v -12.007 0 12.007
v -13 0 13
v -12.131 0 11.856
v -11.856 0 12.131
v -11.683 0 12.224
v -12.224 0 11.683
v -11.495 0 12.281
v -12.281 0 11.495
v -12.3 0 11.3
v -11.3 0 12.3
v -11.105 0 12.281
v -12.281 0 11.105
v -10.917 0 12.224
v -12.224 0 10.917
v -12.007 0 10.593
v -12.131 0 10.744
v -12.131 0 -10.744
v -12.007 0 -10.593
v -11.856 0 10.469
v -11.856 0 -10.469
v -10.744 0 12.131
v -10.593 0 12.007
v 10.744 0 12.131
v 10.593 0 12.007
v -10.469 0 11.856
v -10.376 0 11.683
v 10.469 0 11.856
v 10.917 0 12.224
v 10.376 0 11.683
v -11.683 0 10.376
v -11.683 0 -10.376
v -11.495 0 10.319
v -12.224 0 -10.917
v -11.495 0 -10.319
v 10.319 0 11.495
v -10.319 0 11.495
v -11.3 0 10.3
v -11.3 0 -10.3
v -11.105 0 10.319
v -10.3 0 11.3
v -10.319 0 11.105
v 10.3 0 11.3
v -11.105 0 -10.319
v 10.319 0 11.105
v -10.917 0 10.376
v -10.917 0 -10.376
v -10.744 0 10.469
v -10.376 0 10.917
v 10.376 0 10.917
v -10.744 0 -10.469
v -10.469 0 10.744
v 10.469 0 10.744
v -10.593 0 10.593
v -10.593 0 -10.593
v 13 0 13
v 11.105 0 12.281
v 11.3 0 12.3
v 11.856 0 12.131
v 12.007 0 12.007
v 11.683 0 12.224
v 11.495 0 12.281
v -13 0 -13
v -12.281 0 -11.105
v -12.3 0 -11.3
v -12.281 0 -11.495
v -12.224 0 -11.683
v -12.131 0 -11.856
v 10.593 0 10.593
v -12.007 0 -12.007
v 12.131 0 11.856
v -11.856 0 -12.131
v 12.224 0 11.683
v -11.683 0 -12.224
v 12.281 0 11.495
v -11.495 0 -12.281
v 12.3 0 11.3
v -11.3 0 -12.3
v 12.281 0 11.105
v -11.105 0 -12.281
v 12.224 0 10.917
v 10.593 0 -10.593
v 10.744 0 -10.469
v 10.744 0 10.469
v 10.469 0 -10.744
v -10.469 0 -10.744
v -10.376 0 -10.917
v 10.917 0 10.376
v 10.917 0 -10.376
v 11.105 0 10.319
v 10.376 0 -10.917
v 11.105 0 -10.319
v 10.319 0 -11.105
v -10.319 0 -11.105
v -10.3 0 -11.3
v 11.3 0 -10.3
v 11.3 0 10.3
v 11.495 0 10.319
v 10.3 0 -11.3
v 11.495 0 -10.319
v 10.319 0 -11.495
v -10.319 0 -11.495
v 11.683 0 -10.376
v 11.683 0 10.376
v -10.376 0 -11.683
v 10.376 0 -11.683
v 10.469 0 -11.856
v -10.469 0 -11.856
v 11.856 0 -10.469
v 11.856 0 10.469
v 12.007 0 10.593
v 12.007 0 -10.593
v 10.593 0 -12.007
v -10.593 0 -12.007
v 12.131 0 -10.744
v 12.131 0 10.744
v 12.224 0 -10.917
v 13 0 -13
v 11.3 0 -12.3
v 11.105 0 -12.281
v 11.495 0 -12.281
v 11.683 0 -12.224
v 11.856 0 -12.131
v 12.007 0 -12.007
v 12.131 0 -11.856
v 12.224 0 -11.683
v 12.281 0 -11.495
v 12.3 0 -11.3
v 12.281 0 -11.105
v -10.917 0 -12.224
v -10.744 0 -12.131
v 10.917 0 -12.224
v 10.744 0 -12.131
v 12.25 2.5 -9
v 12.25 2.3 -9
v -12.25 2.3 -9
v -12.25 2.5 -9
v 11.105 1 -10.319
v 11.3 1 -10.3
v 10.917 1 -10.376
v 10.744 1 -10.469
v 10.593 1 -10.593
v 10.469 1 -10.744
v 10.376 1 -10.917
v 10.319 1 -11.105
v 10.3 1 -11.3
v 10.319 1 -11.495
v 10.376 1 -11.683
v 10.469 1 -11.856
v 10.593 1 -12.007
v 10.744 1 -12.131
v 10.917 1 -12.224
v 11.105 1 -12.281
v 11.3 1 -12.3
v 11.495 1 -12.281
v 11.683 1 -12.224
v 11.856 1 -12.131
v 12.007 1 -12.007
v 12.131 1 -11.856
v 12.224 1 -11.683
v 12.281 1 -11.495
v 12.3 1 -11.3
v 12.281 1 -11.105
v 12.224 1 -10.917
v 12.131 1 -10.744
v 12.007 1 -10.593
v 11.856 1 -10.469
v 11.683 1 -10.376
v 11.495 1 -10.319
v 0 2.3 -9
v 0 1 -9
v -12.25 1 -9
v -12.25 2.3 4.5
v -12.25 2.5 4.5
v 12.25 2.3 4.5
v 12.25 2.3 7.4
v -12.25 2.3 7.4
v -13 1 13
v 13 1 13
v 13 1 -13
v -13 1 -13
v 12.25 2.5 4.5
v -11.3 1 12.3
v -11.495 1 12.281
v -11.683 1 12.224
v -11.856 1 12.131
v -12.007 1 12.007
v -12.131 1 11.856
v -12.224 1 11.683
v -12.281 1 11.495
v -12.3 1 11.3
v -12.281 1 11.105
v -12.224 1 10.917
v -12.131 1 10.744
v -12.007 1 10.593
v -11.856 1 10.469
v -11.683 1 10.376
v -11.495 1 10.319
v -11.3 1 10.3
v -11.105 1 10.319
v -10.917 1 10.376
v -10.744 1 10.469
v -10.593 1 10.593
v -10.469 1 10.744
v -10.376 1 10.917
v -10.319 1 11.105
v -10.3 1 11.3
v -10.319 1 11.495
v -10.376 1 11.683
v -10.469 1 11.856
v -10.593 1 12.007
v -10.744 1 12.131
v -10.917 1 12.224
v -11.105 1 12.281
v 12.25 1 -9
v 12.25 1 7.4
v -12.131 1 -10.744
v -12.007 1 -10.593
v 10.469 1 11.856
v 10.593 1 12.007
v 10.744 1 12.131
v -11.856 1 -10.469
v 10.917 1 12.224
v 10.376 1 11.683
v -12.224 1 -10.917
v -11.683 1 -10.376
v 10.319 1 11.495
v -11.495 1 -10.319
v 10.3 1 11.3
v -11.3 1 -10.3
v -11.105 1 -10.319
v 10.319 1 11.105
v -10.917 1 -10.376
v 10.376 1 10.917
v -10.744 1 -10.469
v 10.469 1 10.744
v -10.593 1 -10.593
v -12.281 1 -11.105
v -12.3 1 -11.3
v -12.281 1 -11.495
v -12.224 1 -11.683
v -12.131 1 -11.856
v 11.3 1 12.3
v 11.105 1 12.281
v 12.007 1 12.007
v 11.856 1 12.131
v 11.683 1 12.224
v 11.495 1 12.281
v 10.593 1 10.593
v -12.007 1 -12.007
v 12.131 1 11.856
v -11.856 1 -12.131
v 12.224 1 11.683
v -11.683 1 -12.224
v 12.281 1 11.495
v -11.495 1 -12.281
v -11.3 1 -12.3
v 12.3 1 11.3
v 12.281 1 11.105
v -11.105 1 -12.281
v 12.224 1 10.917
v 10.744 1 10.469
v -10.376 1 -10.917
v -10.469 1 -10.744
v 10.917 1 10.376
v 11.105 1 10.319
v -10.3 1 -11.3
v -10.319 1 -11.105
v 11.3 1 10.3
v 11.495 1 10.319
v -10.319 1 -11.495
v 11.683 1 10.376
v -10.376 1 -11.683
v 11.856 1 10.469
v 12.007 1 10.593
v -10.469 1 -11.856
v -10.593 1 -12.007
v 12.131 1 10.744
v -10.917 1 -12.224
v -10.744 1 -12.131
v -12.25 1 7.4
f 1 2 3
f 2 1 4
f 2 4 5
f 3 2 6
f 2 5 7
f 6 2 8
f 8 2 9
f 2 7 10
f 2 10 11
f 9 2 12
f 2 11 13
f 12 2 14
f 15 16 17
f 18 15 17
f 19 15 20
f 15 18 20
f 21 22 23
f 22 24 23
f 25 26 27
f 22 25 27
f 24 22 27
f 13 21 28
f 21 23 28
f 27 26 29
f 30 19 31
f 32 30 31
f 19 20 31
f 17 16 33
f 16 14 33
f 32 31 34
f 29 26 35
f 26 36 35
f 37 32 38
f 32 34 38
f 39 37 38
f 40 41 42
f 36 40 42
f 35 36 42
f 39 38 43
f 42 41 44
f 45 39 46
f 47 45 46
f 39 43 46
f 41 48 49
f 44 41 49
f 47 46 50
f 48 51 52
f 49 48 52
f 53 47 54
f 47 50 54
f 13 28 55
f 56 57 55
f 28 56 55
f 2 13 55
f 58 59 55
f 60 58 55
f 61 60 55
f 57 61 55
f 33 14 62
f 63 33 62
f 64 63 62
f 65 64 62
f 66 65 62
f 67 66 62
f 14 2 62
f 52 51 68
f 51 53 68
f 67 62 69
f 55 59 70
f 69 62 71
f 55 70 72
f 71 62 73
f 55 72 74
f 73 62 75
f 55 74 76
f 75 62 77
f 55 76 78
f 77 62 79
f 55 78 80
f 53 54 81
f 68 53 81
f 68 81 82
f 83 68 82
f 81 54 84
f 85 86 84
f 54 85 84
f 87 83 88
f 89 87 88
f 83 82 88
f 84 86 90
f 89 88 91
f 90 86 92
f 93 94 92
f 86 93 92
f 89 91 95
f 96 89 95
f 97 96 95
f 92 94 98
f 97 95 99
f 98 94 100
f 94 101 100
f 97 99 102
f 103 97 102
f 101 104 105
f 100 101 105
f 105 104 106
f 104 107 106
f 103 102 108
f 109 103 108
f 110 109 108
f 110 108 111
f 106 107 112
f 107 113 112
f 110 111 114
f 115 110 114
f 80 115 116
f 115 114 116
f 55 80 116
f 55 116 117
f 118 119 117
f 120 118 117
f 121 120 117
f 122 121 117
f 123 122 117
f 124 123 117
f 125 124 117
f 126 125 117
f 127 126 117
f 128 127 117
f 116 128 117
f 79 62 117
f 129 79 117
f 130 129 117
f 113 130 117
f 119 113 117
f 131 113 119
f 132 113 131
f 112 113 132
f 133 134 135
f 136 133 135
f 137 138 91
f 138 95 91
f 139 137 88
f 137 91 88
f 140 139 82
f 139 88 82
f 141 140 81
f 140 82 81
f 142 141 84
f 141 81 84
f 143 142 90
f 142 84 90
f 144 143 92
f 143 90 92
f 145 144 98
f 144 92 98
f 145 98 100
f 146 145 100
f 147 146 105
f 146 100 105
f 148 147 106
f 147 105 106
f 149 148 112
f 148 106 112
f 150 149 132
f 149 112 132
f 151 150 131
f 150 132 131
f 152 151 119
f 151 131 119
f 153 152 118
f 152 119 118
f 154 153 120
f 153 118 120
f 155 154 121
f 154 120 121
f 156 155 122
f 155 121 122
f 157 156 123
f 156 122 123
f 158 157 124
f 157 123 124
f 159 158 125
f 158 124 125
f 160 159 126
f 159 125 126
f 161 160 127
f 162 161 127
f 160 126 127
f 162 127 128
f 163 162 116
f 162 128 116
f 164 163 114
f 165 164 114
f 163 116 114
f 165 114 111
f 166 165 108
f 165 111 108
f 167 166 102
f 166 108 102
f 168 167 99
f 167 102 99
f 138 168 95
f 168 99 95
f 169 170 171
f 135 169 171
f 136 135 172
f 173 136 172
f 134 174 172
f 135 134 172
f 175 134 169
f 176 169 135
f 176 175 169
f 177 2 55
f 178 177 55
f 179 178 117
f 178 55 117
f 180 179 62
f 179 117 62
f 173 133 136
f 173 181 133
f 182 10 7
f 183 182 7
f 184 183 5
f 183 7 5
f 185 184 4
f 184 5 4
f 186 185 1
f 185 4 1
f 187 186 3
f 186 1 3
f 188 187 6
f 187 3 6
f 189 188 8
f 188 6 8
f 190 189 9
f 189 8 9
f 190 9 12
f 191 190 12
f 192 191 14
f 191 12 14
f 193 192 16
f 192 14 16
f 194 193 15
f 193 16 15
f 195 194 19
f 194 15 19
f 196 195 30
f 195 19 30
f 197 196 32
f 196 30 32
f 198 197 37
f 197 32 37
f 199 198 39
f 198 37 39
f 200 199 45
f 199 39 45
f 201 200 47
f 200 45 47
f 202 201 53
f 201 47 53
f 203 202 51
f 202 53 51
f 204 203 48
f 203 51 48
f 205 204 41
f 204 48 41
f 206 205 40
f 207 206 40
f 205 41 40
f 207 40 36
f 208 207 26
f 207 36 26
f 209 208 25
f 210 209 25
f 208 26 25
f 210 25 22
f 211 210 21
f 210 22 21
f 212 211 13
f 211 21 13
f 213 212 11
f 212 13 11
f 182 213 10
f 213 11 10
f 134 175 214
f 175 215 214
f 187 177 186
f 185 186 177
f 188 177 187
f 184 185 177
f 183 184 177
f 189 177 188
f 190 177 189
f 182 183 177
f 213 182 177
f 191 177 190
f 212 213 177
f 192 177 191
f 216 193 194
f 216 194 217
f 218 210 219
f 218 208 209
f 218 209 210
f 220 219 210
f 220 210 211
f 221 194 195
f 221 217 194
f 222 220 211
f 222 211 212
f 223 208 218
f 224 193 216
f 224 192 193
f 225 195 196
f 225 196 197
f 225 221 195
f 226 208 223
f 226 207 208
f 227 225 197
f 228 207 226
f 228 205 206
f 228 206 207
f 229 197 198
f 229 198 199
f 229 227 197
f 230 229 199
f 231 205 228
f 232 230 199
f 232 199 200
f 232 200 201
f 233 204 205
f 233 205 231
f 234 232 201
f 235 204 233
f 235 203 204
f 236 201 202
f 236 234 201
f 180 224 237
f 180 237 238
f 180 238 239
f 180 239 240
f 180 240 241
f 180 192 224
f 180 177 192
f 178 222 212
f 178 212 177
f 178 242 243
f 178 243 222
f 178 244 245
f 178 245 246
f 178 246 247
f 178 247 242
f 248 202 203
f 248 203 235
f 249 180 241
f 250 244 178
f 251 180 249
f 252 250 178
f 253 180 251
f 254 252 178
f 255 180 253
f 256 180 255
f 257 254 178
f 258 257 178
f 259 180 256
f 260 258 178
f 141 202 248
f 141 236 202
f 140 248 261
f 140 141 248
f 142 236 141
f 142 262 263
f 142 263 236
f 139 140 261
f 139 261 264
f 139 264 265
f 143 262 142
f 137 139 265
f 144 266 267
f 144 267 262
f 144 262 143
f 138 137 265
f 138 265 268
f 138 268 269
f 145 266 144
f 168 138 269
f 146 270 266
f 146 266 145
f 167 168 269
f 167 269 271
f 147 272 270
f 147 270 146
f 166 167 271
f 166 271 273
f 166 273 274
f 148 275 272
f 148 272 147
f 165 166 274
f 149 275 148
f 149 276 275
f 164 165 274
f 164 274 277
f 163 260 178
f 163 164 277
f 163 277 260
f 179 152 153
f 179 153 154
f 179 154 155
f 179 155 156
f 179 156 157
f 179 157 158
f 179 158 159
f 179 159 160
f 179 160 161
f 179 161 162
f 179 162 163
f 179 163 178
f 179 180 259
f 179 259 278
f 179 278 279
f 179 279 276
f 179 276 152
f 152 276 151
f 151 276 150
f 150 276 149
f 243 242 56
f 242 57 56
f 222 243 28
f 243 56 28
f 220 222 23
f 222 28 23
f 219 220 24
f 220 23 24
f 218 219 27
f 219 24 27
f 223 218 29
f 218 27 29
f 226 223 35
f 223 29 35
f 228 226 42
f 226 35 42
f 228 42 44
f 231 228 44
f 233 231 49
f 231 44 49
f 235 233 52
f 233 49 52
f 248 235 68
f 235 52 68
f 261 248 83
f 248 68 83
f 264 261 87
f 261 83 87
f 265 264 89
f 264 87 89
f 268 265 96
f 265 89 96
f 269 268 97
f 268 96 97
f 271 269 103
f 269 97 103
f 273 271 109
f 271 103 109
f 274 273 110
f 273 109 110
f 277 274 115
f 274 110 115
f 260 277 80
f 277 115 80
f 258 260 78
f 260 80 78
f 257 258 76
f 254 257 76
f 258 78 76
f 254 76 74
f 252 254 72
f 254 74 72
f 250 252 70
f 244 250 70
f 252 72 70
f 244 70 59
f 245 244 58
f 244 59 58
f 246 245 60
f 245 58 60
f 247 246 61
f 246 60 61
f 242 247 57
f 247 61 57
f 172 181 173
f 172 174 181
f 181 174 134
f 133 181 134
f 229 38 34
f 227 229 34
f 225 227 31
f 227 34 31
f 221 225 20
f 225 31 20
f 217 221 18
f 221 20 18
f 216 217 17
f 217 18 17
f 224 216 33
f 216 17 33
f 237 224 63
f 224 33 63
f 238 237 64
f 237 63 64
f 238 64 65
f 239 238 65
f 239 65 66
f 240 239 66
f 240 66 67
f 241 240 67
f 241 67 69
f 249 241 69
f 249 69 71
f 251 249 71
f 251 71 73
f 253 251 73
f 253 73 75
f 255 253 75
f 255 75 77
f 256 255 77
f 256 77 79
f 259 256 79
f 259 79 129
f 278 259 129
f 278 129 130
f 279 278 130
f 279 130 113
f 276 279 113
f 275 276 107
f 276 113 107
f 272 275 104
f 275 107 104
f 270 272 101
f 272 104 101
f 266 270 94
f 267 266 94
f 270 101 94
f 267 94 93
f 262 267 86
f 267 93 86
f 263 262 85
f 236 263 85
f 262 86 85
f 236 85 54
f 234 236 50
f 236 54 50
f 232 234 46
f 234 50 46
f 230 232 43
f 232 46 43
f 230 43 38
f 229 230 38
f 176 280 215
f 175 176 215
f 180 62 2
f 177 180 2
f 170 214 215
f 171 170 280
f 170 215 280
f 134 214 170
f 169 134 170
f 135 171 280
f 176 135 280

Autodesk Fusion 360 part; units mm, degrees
sketch "Sketch1" plane through (0, 0, 0) normal (0, 1, 0) x (1, 0, 0)
  line L0 (13, 13) -> (-13, 13)
  line L1 (-13, 13) -> (-13, -13)
  line L2 (-13, -13) -> (13, -13)
  line L3 (13, -13) -> (13, 13)
  line L4 (13, 13) -> (-13, -13) construction
  line L5 (-13, 13) -> (13, -13) construction
  dimension "d1" = 26
  dimension "d2" = 26
extrude "Extrude1" add sketch "Sketch1" along normal blind 1 makes body 1
hole "Hole1" at (-11.3, 1, -11.3) direction (0, -1, 0) diameter 2 depth 3.5 tip angle 118 bodies 1
hole "Hole2" at (11.3, 1, -11.3) direction (0, -1, 0) diameter 2 depth 3.5 tip angle 118 bodies 1
hole "Hole3" at (-11.3, 1, 11.3) direction (0, -1, 0) diameter 2 depth 3.5 tip angle 118 bodies 1
hole "Hole4" at (11.3, 1, 11.3) direction (0, -1, 0) diameter 2 depth 3.5 tip angle 118 bodies 1
sketch "Sketch2" plane through (0, 1, 0) normal (0, 1, 0) x (-1, 0, 0)
  circle A0 centre (-11.3, 11.3) radius 1
  circle A1 centre (11.3, 11.3) radius 1
  circle A2 centre (-11.3, -11.3) radius 1
  circle A3 centre (11.3, -11.3) radius 1
  line L0 (-13, 13) -> (-13, -13)
  line L1 (-13, -13) -> (13, -13)
  line L2 (13, -13) -> (13, 13)
  line L3 (13, 13) -> (-13, 13)
  line L4 (0, -13) -> (0, -9)
  line L5 (0, -9) -> (0, -0.8)
  line L6 (-12.25, -9) -> (12.25, -9)
  line L7 (12.25, -9) -> (12.25, 7.4)
  line L8 (12.25, 7.4) -> (-12.25, 7.4)
  line L9 (-12.25, 7.4) -> (-12.25, -9)
  line L10 (-12.25, -9) -> (12.25, 7.4) construction
  line L11 (12.25, -9) -> (-12.25, 7.4) construction
  point P0 (0, -0.8)
  dimension "d25" = 4
  dimension "d26" = 8.2
  dimension "d27" = 24.5
  dimension "d28" = 16.4
extrude "Extrude2" add sketch "Sketch2" along normal blind 1.3 separate body contours L6 L7 L8 L9 makes body 2
sketch "Sketch3" plane through (0, 2.3, 0) normal (0, 1, 0) x (-1, 0, 0)
  line L0 (-12.25, 7.4) -> (-12.25, -9)
  line L1 (-12.25, -9) -> (12.25, -9)
  line L2 (12.25, -9) -> (12.25, 7.4)
  line L3 (12.25, 7.4) -> (-12.25, 7.4)
  line L4 (12.25, -9) -> (-12.25, -9)
  line L5 (-12.25, -9) -> (-12.25, 4.5)
  line L6 (-12.25, 4.5) -> (12.25, 4.5)
  line L7 (12.25, 4.5) -> (12.25, -9)
  dimension "d31" = 13.5
extrude "Extrude3" add sketch "Sketch3" along normal blind 0.2 separate body contours L0 L1 L2 L4 L5 L6 L7 makes body 3
